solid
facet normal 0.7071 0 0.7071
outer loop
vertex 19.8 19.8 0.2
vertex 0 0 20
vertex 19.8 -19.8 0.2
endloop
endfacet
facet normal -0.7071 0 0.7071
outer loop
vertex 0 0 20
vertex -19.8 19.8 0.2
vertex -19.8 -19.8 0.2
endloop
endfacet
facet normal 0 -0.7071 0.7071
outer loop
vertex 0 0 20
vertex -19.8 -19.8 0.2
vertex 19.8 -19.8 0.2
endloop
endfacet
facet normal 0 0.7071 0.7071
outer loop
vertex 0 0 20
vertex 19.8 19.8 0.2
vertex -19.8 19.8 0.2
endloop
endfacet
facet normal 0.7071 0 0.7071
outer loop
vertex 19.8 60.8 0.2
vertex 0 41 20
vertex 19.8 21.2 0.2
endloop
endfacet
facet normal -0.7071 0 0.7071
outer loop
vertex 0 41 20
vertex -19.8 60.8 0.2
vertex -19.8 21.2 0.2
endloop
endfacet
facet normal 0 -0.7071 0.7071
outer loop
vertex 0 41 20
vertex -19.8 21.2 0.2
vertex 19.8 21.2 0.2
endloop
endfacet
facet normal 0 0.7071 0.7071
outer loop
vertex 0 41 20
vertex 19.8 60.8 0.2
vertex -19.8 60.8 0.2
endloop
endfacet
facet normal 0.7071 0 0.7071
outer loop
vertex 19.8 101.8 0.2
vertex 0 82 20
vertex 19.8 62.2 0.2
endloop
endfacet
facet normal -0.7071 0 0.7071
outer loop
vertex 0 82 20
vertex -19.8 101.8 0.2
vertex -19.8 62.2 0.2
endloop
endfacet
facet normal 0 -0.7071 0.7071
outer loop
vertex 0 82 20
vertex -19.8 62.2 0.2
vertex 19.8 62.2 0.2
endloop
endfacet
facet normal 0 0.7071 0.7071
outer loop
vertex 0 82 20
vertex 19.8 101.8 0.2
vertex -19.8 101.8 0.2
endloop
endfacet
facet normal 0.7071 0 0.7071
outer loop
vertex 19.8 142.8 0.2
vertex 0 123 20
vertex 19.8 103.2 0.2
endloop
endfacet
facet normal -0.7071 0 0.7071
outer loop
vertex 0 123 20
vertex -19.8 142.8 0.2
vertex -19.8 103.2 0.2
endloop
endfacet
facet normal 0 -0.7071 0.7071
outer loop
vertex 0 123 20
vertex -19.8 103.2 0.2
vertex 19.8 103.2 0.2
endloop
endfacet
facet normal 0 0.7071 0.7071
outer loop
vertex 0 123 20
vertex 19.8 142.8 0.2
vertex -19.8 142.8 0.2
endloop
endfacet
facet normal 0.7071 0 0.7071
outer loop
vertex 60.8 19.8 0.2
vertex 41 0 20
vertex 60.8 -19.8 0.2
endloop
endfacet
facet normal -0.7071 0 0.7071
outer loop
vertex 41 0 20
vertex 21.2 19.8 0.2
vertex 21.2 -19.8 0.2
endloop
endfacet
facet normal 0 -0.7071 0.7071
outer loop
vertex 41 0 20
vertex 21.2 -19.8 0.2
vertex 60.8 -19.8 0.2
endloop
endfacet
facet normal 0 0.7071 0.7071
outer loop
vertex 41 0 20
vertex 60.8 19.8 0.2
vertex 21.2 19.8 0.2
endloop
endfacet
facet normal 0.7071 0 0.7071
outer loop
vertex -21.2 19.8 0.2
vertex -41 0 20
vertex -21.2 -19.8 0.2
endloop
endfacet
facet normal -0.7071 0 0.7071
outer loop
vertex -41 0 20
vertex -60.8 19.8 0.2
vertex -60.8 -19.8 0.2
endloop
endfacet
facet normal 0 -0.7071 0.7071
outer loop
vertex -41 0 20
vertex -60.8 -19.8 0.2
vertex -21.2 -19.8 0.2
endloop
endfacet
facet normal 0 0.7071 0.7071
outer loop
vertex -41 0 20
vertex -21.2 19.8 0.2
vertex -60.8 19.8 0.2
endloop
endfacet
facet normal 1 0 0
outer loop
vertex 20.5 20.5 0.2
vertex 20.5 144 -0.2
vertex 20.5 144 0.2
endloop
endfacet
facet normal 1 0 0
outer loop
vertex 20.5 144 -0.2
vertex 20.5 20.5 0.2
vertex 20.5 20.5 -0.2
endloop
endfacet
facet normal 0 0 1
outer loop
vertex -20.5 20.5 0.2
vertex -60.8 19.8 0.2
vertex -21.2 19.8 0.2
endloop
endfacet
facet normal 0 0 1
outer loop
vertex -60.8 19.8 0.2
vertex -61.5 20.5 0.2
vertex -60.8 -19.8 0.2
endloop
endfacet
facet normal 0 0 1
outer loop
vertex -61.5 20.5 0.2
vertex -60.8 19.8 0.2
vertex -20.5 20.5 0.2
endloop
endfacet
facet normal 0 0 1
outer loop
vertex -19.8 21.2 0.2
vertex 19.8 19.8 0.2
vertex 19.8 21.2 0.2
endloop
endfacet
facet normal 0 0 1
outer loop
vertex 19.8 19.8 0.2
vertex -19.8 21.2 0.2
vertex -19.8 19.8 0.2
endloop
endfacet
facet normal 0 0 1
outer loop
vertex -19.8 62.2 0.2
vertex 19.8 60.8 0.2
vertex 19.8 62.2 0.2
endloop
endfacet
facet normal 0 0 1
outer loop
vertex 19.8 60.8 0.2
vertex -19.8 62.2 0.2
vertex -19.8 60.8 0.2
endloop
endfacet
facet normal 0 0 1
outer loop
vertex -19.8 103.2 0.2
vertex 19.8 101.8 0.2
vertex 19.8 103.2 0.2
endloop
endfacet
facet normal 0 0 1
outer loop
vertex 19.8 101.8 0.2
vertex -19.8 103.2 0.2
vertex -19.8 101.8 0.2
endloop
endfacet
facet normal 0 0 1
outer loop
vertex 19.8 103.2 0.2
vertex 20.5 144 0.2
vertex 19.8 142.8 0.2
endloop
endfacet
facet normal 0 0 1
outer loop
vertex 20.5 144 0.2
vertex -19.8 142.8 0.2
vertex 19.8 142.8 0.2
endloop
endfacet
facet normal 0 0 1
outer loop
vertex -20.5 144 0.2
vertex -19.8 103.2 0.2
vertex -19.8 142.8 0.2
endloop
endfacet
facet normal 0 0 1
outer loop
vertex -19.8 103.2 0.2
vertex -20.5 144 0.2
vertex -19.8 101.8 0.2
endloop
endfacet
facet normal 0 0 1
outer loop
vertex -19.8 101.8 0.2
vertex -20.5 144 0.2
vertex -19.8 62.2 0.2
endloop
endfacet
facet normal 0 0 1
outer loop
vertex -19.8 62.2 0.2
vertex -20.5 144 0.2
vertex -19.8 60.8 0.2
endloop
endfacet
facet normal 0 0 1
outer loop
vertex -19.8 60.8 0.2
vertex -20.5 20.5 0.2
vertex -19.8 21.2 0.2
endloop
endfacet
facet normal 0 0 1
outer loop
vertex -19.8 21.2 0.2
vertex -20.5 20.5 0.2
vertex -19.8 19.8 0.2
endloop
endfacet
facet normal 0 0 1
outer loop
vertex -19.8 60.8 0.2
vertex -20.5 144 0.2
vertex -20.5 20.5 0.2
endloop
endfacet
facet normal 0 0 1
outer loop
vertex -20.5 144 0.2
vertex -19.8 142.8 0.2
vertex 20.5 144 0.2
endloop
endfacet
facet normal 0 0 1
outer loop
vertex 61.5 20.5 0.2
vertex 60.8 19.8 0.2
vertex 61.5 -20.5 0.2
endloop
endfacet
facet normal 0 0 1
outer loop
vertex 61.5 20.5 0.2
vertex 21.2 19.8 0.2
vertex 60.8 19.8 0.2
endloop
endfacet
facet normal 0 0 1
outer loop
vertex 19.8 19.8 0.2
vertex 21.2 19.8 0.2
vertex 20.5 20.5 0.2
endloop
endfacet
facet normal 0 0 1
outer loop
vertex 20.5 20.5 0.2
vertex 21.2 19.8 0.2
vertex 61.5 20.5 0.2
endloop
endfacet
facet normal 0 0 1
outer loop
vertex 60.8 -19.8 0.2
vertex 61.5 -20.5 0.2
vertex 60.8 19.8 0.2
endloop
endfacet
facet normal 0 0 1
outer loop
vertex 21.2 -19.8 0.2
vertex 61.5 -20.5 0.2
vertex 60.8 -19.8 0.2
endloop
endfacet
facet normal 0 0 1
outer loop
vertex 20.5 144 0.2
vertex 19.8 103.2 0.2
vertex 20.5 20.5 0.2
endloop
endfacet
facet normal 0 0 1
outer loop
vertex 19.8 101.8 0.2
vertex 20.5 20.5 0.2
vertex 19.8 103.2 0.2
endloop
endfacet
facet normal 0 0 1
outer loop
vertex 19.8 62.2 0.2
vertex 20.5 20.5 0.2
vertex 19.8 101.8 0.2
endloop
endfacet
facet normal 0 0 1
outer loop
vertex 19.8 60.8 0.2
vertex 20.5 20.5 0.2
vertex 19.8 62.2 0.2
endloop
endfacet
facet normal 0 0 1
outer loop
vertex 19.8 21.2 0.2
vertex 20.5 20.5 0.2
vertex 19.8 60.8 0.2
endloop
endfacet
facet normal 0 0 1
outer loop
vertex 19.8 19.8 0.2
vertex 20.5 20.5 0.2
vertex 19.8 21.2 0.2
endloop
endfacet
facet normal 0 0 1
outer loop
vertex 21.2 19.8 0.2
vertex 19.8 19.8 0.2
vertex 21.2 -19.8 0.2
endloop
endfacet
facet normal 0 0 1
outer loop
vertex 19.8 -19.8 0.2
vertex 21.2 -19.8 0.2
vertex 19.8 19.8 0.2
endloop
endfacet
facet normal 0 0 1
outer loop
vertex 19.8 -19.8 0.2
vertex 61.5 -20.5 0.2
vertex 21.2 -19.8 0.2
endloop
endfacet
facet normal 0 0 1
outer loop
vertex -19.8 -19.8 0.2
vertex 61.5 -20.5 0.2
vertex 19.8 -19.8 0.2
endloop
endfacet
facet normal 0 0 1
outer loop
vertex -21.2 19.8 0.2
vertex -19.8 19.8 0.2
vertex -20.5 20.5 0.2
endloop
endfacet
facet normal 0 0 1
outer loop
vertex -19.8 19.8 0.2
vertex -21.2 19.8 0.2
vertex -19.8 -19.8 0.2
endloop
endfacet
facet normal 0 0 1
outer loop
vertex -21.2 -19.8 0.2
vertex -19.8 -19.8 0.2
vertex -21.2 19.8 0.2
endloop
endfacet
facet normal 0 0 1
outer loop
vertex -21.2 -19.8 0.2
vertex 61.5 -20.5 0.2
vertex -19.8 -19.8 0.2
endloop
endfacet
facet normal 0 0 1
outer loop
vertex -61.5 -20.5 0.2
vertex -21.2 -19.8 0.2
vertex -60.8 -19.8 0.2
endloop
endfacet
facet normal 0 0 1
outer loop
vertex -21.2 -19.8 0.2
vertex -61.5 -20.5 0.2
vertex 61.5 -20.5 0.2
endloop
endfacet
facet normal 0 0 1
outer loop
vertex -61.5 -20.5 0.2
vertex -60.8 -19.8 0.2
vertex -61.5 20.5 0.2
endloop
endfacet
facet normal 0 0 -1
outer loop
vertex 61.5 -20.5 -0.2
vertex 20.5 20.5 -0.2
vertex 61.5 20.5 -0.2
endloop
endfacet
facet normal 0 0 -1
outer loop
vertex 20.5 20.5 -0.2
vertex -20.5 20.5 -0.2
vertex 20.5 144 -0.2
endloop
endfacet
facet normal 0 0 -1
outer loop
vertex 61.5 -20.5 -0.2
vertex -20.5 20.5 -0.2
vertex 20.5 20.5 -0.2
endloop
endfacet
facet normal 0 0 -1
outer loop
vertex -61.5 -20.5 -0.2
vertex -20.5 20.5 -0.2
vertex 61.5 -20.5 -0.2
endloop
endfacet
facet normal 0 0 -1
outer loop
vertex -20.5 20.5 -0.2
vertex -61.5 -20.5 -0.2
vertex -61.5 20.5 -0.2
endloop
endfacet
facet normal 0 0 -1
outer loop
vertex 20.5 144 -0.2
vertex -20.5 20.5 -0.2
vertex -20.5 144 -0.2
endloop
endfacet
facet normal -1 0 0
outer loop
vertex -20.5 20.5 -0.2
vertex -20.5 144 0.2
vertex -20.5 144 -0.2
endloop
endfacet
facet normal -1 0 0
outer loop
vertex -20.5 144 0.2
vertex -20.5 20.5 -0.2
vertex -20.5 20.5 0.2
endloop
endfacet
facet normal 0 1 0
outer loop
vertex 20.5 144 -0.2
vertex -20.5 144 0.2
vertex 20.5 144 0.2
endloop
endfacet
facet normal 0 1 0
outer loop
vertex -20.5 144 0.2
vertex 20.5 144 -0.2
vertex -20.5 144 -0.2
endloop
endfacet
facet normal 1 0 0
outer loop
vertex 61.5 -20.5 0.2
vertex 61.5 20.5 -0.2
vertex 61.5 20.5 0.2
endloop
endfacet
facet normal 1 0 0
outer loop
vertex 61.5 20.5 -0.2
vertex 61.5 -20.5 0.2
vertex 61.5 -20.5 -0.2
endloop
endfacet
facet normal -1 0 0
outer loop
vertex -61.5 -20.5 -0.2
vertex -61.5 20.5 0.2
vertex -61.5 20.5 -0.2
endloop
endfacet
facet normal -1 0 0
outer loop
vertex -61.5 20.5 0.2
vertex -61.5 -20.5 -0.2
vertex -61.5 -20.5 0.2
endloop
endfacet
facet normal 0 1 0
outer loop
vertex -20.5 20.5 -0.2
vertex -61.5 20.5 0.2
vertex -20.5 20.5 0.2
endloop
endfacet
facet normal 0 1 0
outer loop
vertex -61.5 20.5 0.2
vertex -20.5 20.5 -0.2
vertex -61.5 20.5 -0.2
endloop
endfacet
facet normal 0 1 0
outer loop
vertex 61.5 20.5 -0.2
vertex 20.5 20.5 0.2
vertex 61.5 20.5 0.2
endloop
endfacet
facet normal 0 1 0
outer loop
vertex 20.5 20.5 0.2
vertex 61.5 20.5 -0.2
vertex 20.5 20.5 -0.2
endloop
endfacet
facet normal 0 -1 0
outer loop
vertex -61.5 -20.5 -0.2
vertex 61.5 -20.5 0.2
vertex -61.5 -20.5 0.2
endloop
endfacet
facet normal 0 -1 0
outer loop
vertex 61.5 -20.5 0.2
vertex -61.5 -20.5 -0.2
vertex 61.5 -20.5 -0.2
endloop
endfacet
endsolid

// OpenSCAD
height = 20;

pyramid(height);
translate([0,2*height+1,0]) pyramid(height);
translate([0,4*height+2,0]) pyramid(height);
translate([0,6*height+3,0]) pyramid(height);

translate([2*height+1,0,0]) pyramid(height);
translate([-2*height-1,0,0]) pyramid(height);

translate([0,3*height+2,0]) cube(size=[2*height+1, 8*height+4,.4], center=true);
translate([0,0,0]) cube(size=[6*height+3, 2*height+1,.4], center=true);

module pyramid(height) {
    edge = 2*height;
    tinyValue = 0.0001;
    hull() {
        cube(size=[edge, edge,tinyValue], center=true);
        translate([0, 0, height]) cube(size=[tinyValue, tinyValue, tinyValue], center=true);
    }


}
